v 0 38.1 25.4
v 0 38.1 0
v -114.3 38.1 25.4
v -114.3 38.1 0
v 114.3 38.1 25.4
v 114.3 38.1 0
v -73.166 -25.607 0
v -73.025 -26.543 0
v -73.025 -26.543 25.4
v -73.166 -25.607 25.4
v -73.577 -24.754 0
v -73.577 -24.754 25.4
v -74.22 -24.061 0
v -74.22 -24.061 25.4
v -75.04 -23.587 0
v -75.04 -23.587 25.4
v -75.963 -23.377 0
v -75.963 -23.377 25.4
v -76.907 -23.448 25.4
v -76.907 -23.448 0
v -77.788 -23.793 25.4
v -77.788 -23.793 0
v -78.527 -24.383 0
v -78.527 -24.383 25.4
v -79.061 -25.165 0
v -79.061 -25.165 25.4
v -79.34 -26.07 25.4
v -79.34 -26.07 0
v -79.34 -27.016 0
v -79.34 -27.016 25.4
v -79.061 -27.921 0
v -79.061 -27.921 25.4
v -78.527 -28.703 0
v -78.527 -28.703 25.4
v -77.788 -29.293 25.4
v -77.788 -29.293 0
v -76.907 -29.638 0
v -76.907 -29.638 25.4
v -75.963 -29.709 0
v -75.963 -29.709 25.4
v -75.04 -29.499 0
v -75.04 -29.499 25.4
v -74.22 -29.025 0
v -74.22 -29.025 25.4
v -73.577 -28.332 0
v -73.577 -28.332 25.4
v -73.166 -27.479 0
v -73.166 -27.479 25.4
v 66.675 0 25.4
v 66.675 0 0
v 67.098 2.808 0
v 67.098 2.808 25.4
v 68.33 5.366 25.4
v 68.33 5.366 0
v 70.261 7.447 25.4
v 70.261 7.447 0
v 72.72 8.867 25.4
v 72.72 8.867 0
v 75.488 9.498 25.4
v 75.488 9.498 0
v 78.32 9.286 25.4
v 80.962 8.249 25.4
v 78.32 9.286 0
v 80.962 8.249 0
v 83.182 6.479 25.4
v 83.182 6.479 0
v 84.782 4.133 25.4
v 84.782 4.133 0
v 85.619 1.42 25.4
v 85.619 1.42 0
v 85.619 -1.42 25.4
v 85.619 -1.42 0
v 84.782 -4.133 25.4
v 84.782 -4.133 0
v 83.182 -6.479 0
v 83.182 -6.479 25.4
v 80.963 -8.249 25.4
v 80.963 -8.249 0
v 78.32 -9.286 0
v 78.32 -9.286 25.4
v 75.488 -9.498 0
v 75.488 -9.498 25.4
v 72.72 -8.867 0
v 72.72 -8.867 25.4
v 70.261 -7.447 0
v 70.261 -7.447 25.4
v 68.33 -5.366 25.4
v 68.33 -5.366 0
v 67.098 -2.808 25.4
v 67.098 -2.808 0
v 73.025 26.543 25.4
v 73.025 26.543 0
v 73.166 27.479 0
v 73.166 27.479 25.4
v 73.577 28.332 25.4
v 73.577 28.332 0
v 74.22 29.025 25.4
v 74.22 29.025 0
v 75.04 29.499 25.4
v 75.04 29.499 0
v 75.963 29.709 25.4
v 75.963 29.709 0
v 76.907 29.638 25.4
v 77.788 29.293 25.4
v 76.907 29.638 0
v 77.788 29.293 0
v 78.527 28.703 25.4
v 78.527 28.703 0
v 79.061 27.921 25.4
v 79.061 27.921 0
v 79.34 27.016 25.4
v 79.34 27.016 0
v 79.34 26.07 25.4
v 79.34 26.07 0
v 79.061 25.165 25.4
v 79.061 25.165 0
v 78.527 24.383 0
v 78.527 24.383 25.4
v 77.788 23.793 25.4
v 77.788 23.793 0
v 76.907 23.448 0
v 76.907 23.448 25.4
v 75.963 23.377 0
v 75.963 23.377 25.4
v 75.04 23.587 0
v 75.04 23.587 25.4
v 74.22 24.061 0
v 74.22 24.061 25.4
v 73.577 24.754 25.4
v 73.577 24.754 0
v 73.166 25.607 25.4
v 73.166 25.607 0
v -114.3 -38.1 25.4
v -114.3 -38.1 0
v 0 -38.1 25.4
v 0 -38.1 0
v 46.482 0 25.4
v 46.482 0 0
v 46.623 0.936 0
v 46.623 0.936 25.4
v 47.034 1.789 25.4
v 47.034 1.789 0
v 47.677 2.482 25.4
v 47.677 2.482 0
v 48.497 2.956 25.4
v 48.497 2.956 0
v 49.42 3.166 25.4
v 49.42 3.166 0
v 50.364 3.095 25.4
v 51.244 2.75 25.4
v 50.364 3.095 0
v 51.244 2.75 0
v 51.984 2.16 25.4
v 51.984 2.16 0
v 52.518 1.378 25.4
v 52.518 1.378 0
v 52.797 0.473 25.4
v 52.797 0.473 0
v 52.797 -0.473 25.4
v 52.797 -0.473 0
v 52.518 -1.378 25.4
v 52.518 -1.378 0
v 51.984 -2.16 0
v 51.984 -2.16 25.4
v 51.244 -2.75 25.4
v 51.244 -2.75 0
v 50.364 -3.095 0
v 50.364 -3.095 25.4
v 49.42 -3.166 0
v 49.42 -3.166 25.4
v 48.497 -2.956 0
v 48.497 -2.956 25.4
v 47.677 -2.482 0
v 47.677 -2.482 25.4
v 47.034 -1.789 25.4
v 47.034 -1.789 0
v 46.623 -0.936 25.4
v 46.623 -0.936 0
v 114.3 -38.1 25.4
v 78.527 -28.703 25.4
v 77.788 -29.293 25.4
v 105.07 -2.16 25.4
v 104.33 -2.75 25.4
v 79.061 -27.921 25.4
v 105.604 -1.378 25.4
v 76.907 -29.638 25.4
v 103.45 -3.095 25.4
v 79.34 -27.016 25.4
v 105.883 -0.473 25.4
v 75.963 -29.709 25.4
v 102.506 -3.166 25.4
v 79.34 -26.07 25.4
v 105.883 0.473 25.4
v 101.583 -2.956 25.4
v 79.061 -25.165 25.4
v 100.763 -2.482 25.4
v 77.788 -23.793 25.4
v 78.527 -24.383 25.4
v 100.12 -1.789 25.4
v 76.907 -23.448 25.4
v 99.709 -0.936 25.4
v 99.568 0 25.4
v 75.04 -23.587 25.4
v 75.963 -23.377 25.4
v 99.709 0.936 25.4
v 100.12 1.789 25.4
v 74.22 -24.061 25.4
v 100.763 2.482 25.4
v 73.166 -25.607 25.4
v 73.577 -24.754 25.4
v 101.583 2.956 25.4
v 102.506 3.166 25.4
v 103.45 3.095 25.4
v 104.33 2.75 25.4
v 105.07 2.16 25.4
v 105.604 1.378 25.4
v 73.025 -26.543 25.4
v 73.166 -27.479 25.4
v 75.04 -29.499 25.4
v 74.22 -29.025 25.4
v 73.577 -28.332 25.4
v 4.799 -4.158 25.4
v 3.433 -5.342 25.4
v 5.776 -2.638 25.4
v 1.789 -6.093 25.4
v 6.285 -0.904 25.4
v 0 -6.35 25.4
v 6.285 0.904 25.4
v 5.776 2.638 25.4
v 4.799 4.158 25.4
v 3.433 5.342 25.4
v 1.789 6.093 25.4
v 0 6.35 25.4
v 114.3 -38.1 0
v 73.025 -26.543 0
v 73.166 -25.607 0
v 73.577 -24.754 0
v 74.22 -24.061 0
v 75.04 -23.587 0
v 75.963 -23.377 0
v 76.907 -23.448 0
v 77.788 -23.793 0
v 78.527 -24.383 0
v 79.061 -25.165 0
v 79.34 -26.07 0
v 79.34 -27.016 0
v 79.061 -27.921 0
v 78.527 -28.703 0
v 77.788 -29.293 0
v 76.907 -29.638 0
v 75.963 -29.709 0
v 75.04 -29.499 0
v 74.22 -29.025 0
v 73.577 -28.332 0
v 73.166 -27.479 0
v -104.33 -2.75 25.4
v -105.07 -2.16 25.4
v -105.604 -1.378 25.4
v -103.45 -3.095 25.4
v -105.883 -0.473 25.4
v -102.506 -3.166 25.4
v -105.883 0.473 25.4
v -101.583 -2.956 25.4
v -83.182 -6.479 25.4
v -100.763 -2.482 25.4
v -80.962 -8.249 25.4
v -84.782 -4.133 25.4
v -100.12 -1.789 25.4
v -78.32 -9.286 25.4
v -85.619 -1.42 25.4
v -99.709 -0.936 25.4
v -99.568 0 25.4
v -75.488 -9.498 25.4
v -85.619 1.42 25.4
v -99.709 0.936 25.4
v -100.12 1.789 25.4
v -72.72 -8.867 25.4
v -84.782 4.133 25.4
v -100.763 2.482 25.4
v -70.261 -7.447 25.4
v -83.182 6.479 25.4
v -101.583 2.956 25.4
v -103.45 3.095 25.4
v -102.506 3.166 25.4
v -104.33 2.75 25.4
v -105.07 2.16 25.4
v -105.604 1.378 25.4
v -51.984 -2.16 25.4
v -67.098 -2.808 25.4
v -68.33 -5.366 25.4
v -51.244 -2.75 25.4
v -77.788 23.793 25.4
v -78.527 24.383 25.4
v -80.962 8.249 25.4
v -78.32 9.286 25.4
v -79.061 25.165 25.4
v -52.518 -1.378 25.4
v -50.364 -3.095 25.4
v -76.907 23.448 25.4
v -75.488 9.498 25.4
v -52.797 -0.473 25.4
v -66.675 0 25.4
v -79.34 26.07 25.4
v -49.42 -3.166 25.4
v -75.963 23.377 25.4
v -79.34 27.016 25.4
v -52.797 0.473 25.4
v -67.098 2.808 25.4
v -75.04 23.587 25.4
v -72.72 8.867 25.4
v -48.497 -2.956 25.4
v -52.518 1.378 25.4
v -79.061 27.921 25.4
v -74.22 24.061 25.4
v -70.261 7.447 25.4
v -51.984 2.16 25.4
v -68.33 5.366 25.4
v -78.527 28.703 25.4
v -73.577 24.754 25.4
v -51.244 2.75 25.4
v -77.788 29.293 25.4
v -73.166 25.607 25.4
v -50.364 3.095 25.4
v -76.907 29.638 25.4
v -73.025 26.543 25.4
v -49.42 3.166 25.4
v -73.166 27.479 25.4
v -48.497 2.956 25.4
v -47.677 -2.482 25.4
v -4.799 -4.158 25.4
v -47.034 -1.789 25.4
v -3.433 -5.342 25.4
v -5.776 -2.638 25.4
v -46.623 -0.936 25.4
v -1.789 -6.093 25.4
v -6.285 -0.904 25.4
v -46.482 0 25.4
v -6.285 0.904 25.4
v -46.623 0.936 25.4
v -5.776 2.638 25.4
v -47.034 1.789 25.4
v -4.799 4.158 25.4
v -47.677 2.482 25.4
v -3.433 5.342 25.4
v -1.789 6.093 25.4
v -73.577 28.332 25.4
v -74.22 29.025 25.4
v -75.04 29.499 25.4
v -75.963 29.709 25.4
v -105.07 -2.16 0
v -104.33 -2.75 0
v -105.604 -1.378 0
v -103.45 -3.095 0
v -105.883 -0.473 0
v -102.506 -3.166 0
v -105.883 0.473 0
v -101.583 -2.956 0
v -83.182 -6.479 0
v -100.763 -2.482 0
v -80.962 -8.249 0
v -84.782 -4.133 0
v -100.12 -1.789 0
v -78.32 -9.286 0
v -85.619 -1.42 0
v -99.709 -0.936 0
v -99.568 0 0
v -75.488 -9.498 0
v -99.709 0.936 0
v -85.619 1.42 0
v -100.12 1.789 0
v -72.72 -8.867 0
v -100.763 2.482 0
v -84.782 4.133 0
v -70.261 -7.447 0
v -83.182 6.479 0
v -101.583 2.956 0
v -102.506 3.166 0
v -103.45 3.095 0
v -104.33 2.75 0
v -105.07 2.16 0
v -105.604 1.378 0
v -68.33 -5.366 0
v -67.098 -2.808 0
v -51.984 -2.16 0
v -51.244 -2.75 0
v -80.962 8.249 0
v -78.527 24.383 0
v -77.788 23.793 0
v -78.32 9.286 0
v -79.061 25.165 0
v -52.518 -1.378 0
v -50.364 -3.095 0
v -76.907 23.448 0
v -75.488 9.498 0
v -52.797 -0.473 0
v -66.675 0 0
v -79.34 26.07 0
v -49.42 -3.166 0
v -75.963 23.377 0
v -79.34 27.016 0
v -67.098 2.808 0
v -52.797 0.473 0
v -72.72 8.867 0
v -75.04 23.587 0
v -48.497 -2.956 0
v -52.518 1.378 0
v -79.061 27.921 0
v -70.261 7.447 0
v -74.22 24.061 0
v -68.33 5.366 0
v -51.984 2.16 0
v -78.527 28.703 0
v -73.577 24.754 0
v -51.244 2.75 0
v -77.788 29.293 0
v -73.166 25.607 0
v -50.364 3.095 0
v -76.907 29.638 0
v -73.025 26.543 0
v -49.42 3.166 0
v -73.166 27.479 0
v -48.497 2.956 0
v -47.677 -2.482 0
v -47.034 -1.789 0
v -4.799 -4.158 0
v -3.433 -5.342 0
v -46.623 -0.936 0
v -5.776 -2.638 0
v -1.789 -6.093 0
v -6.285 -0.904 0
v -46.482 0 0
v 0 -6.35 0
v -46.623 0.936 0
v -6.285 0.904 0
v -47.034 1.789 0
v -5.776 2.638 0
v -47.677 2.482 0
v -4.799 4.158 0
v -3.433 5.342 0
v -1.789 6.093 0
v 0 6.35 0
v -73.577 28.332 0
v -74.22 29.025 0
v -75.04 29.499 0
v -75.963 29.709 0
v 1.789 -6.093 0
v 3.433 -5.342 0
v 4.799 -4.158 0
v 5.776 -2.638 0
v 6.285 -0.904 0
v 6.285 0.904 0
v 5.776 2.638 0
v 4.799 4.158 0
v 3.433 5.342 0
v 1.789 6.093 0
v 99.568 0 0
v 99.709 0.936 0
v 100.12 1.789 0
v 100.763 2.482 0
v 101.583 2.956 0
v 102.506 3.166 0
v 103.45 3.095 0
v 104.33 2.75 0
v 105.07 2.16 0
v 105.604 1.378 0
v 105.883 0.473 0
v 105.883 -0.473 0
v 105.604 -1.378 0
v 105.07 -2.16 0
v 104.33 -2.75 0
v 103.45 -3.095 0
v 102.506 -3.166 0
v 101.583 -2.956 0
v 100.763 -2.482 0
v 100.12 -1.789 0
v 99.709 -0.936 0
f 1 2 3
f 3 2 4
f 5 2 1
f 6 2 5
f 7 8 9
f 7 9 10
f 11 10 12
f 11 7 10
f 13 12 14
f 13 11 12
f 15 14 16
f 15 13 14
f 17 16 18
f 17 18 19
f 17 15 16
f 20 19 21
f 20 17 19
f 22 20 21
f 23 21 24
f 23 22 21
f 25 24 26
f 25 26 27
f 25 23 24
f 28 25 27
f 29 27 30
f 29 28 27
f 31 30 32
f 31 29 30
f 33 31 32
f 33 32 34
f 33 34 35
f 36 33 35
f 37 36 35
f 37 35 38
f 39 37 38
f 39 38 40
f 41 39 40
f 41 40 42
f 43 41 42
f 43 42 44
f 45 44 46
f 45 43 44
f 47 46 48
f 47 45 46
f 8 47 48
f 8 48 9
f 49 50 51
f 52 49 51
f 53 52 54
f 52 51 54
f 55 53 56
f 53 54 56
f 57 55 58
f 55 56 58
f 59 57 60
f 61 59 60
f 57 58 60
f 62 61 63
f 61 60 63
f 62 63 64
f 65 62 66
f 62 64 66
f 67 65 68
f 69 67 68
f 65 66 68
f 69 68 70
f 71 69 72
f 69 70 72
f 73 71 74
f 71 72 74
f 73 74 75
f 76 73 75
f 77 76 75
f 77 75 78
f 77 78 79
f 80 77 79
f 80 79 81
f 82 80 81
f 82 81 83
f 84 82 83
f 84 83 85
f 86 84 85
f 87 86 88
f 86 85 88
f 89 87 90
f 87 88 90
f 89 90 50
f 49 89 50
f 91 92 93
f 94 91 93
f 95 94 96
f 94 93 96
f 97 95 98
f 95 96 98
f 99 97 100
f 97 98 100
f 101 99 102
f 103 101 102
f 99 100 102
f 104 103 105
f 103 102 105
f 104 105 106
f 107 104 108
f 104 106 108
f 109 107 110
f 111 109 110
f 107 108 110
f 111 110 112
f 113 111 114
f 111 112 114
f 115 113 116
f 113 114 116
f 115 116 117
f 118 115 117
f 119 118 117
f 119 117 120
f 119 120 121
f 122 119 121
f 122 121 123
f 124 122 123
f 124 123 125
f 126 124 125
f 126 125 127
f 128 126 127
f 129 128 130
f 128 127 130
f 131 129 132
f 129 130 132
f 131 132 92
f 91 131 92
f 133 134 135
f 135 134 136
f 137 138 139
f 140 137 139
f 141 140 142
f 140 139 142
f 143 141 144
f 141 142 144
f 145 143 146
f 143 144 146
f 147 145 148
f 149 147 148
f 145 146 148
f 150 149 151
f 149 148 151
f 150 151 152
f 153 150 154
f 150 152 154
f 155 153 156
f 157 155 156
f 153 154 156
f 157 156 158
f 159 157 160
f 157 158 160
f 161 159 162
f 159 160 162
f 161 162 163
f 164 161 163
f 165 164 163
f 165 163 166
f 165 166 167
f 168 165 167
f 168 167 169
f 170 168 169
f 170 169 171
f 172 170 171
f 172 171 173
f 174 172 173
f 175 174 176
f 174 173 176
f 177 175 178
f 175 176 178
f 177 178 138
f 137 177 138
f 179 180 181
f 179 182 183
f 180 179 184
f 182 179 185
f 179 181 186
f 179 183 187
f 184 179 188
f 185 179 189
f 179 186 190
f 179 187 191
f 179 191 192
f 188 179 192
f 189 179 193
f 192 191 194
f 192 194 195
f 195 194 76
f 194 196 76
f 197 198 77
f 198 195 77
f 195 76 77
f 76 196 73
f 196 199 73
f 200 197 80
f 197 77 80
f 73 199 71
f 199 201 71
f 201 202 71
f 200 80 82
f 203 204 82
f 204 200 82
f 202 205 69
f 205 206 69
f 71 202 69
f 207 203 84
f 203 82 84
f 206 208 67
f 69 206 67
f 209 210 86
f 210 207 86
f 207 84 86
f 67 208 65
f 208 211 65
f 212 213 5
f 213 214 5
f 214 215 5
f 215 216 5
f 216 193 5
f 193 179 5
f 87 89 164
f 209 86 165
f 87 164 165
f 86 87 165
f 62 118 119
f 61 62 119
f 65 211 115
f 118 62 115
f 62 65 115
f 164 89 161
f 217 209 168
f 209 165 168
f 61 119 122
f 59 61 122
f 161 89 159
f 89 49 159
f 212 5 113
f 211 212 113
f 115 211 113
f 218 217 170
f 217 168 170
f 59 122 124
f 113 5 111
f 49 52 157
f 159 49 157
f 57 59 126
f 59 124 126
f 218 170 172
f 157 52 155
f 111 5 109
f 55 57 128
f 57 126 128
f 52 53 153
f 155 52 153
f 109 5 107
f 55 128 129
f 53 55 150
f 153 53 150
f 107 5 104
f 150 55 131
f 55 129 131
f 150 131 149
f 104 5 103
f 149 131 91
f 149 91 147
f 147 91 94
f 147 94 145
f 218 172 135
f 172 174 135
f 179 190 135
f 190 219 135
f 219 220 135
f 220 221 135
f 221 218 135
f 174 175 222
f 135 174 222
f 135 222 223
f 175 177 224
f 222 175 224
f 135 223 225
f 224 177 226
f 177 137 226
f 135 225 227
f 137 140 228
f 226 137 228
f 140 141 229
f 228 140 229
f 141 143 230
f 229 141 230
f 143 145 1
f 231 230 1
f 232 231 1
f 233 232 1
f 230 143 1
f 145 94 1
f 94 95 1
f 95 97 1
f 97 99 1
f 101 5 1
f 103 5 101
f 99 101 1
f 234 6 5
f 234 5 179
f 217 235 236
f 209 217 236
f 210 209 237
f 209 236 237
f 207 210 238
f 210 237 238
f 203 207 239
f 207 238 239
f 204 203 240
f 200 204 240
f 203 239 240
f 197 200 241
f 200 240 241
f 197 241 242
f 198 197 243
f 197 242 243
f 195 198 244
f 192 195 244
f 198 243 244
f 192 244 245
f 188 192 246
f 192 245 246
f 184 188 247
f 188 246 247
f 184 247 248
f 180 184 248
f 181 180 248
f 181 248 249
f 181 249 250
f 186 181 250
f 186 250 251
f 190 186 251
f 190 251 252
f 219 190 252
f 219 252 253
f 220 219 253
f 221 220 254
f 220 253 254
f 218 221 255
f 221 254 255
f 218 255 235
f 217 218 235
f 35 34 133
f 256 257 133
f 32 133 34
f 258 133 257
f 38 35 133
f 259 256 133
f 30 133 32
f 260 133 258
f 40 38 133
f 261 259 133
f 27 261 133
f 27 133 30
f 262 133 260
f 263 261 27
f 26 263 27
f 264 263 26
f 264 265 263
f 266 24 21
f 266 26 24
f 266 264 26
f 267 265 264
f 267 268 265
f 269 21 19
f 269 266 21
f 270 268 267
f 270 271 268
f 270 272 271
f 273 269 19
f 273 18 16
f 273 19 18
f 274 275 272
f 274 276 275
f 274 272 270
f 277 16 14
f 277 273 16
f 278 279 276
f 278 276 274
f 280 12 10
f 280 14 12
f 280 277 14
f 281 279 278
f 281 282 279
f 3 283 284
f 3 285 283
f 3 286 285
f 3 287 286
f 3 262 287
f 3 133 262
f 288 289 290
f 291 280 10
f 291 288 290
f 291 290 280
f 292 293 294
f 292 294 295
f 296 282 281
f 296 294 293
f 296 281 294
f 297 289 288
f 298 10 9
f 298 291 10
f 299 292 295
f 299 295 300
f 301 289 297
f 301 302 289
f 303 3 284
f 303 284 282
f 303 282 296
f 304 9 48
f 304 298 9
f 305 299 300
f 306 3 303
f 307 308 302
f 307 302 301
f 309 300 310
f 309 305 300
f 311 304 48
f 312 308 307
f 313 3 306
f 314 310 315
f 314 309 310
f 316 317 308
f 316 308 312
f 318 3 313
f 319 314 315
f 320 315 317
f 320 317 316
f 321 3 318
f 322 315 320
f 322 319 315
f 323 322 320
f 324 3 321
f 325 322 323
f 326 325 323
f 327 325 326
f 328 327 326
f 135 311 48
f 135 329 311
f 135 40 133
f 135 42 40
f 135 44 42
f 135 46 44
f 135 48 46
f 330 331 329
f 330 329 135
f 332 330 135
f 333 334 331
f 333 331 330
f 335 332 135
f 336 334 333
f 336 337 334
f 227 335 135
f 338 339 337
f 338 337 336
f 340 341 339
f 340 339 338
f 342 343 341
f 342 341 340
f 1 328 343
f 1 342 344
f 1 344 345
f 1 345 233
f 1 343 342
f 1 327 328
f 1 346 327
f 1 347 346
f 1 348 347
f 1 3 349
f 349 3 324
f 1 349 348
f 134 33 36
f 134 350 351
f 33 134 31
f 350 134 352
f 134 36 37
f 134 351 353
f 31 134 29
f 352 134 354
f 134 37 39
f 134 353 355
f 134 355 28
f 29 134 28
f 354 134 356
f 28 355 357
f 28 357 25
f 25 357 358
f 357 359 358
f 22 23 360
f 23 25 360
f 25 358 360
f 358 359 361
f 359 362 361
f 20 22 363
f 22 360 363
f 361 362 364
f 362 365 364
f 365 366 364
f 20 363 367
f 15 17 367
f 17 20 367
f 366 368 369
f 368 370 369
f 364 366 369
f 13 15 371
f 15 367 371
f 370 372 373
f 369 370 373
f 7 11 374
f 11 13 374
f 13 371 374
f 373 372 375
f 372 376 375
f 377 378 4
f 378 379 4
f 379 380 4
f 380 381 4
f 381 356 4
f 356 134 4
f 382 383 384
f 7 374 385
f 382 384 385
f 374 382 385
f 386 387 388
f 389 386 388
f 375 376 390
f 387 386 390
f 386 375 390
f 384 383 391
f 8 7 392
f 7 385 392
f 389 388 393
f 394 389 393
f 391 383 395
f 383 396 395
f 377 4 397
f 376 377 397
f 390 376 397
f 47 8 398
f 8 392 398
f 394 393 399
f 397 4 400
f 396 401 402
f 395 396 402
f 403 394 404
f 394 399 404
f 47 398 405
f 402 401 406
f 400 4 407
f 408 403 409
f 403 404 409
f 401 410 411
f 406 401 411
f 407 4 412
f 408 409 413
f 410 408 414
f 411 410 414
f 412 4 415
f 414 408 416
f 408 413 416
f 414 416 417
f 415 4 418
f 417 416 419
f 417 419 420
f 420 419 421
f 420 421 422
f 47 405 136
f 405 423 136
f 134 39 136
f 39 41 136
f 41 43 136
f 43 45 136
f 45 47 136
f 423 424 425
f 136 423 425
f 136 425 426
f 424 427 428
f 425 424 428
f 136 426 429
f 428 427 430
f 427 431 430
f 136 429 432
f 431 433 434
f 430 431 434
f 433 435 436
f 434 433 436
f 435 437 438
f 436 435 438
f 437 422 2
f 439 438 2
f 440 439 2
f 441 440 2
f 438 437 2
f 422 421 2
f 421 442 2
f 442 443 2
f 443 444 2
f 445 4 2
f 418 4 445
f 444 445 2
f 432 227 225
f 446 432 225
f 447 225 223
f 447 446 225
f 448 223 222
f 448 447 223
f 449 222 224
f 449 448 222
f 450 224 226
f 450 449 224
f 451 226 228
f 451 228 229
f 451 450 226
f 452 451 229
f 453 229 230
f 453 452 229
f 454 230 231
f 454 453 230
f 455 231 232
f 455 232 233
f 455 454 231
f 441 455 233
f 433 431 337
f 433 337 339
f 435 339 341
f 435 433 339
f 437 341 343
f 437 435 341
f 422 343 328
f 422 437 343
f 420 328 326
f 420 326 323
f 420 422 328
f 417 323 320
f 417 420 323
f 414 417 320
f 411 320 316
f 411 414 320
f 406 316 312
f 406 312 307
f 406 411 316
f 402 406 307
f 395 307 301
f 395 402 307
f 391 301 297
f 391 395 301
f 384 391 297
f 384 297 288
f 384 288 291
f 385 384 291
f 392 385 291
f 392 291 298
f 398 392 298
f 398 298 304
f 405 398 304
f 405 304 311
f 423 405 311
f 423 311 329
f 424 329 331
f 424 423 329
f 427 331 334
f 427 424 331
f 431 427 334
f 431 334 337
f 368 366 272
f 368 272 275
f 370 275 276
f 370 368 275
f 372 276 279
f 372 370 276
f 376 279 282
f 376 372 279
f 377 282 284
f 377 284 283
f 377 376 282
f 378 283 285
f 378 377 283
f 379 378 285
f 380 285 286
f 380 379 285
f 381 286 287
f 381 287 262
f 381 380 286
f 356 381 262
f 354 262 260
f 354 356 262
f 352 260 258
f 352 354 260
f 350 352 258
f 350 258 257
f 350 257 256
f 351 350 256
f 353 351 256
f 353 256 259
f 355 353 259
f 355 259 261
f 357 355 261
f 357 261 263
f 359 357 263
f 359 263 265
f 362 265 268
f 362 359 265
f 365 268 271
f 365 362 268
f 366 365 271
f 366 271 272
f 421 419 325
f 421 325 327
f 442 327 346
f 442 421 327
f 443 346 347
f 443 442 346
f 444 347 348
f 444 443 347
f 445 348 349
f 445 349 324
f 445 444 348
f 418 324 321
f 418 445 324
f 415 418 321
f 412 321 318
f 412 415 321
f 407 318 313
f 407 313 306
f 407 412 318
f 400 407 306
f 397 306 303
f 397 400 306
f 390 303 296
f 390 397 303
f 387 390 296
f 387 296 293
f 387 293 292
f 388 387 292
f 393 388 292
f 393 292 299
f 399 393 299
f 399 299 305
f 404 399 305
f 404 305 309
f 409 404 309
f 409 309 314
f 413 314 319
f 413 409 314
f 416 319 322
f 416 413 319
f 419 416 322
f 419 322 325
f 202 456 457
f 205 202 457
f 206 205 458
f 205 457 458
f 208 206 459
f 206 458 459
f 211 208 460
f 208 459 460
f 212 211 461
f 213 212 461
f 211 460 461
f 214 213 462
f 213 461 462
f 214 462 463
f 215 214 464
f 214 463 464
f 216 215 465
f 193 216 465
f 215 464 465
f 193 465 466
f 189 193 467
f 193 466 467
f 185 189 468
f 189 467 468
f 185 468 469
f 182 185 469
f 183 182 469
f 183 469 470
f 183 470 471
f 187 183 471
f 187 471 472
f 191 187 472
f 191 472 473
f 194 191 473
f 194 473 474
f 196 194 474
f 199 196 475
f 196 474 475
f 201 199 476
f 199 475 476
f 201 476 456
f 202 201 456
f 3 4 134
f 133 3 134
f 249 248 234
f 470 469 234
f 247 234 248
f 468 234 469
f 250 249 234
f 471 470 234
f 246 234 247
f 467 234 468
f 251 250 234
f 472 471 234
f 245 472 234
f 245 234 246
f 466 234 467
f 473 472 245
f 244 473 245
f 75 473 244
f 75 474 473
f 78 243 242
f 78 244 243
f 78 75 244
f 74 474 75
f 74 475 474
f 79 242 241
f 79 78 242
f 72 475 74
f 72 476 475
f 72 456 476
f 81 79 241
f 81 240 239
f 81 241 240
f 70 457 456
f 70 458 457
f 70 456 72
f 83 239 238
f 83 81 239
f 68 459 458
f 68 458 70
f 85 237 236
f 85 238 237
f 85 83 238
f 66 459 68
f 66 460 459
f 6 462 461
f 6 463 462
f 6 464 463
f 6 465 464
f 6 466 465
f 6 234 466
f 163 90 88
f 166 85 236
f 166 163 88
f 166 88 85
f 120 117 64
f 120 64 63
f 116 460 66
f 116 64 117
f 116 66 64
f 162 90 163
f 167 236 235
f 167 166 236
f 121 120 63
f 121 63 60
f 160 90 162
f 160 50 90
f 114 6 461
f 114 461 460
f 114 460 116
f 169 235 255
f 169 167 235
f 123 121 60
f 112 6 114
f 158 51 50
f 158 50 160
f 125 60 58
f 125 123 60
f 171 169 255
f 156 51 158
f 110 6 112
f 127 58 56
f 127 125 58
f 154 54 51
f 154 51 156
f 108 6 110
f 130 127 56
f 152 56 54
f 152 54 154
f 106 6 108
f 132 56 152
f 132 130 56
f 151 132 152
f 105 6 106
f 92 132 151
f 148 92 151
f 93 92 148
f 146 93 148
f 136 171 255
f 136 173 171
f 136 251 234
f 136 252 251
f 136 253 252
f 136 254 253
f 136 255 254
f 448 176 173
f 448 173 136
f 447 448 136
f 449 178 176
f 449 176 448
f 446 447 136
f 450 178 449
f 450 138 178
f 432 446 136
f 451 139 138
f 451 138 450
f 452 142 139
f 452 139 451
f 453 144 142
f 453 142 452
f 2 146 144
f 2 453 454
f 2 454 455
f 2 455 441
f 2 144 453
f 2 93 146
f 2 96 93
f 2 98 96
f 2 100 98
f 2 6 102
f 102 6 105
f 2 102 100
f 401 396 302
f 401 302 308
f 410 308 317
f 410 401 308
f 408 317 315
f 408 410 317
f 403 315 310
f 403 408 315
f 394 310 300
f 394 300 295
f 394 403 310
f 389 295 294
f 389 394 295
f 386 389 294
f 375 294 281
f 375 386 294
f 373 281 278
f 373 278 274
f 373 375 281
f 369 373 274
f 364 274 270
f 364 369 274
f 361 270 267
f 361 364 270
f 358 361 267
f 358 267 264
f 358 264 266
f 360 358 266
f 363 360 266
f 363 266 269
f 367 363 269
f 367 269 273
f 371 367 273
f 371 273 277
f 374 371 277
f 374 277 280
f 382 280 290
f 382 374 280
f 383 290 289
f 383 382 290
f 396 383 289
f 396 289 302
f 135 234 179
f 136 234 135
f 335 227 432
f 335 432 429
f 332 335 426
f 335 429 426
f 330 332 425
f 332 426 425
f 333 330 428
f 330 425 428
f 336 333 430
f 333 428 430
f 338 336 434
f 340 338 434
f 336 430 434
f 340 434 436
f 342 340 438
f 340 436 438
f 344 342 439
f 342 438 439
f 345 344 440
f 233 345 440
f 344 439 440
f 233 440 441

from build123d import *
from build123d import SkipClean  # not in build123d's __all__

# Parameters (mm, degrees)
F0_R     = 3.175
F0_R_2   = 9.525
F1_DEPTH = 25.4


# Not quite as in the source:
# - a pattern or mirror of a feature is missing from the dataset's text; its kind, count and spacing are read off the source's solid


with BuildPart() as f1:
    # F0 (on Top) → F1 (new body)
    with BuildSketch(Plane.XY):
        with BuildLine():
            Line((0, 38.1), (-114.3, 38.1))
            Line((-114.3, 38.1), (-114.3, -38.1))
            Line((-114.3, -38.1), (0, -38.1))
            Line((0, -38.1), (0, -6.35))
            ThreePointArc((0, -6.35), (-6.35, 0), (0, 6.35))
            Line((0, 6.35), (0, 38.1))
        make_face()
        with Locations((-76.2, -26.543)):
            Circle(F0_R, mode=Mode.SUBTRACT)
        with Locations((-102.743, 0)):
            Circle(F0_R, mode=Mode.SUBTRACT)
        with Locations((-76.2, 0)):
            Circle(F0_R_2, mode=Mode.SUBTRACT)
        with Locations((-76.2, 26.543)):
            Circle(F0_R, mode=Mode.SUBTRACT)
        with Locations((-49.657, 0)):
            Circle(F0_R, mode=Mode.SUBTRACT)
    extrude(amount=F1_DEPTH)

    # F1_copies: F1 across plane


with BuildPart() as f1_1:
    add(f1.part, clean=False)
    with SkipClean():  # cleaning this boolean's faces spoils the solid; the shape is the same uncleaned
        add(f1.part.mirror(Plane(origin=(0, 0, 0), x_dir=(0, 0, 1), z_dir=(1, 0, 0))), clean=False)


solid = f1_1.part
